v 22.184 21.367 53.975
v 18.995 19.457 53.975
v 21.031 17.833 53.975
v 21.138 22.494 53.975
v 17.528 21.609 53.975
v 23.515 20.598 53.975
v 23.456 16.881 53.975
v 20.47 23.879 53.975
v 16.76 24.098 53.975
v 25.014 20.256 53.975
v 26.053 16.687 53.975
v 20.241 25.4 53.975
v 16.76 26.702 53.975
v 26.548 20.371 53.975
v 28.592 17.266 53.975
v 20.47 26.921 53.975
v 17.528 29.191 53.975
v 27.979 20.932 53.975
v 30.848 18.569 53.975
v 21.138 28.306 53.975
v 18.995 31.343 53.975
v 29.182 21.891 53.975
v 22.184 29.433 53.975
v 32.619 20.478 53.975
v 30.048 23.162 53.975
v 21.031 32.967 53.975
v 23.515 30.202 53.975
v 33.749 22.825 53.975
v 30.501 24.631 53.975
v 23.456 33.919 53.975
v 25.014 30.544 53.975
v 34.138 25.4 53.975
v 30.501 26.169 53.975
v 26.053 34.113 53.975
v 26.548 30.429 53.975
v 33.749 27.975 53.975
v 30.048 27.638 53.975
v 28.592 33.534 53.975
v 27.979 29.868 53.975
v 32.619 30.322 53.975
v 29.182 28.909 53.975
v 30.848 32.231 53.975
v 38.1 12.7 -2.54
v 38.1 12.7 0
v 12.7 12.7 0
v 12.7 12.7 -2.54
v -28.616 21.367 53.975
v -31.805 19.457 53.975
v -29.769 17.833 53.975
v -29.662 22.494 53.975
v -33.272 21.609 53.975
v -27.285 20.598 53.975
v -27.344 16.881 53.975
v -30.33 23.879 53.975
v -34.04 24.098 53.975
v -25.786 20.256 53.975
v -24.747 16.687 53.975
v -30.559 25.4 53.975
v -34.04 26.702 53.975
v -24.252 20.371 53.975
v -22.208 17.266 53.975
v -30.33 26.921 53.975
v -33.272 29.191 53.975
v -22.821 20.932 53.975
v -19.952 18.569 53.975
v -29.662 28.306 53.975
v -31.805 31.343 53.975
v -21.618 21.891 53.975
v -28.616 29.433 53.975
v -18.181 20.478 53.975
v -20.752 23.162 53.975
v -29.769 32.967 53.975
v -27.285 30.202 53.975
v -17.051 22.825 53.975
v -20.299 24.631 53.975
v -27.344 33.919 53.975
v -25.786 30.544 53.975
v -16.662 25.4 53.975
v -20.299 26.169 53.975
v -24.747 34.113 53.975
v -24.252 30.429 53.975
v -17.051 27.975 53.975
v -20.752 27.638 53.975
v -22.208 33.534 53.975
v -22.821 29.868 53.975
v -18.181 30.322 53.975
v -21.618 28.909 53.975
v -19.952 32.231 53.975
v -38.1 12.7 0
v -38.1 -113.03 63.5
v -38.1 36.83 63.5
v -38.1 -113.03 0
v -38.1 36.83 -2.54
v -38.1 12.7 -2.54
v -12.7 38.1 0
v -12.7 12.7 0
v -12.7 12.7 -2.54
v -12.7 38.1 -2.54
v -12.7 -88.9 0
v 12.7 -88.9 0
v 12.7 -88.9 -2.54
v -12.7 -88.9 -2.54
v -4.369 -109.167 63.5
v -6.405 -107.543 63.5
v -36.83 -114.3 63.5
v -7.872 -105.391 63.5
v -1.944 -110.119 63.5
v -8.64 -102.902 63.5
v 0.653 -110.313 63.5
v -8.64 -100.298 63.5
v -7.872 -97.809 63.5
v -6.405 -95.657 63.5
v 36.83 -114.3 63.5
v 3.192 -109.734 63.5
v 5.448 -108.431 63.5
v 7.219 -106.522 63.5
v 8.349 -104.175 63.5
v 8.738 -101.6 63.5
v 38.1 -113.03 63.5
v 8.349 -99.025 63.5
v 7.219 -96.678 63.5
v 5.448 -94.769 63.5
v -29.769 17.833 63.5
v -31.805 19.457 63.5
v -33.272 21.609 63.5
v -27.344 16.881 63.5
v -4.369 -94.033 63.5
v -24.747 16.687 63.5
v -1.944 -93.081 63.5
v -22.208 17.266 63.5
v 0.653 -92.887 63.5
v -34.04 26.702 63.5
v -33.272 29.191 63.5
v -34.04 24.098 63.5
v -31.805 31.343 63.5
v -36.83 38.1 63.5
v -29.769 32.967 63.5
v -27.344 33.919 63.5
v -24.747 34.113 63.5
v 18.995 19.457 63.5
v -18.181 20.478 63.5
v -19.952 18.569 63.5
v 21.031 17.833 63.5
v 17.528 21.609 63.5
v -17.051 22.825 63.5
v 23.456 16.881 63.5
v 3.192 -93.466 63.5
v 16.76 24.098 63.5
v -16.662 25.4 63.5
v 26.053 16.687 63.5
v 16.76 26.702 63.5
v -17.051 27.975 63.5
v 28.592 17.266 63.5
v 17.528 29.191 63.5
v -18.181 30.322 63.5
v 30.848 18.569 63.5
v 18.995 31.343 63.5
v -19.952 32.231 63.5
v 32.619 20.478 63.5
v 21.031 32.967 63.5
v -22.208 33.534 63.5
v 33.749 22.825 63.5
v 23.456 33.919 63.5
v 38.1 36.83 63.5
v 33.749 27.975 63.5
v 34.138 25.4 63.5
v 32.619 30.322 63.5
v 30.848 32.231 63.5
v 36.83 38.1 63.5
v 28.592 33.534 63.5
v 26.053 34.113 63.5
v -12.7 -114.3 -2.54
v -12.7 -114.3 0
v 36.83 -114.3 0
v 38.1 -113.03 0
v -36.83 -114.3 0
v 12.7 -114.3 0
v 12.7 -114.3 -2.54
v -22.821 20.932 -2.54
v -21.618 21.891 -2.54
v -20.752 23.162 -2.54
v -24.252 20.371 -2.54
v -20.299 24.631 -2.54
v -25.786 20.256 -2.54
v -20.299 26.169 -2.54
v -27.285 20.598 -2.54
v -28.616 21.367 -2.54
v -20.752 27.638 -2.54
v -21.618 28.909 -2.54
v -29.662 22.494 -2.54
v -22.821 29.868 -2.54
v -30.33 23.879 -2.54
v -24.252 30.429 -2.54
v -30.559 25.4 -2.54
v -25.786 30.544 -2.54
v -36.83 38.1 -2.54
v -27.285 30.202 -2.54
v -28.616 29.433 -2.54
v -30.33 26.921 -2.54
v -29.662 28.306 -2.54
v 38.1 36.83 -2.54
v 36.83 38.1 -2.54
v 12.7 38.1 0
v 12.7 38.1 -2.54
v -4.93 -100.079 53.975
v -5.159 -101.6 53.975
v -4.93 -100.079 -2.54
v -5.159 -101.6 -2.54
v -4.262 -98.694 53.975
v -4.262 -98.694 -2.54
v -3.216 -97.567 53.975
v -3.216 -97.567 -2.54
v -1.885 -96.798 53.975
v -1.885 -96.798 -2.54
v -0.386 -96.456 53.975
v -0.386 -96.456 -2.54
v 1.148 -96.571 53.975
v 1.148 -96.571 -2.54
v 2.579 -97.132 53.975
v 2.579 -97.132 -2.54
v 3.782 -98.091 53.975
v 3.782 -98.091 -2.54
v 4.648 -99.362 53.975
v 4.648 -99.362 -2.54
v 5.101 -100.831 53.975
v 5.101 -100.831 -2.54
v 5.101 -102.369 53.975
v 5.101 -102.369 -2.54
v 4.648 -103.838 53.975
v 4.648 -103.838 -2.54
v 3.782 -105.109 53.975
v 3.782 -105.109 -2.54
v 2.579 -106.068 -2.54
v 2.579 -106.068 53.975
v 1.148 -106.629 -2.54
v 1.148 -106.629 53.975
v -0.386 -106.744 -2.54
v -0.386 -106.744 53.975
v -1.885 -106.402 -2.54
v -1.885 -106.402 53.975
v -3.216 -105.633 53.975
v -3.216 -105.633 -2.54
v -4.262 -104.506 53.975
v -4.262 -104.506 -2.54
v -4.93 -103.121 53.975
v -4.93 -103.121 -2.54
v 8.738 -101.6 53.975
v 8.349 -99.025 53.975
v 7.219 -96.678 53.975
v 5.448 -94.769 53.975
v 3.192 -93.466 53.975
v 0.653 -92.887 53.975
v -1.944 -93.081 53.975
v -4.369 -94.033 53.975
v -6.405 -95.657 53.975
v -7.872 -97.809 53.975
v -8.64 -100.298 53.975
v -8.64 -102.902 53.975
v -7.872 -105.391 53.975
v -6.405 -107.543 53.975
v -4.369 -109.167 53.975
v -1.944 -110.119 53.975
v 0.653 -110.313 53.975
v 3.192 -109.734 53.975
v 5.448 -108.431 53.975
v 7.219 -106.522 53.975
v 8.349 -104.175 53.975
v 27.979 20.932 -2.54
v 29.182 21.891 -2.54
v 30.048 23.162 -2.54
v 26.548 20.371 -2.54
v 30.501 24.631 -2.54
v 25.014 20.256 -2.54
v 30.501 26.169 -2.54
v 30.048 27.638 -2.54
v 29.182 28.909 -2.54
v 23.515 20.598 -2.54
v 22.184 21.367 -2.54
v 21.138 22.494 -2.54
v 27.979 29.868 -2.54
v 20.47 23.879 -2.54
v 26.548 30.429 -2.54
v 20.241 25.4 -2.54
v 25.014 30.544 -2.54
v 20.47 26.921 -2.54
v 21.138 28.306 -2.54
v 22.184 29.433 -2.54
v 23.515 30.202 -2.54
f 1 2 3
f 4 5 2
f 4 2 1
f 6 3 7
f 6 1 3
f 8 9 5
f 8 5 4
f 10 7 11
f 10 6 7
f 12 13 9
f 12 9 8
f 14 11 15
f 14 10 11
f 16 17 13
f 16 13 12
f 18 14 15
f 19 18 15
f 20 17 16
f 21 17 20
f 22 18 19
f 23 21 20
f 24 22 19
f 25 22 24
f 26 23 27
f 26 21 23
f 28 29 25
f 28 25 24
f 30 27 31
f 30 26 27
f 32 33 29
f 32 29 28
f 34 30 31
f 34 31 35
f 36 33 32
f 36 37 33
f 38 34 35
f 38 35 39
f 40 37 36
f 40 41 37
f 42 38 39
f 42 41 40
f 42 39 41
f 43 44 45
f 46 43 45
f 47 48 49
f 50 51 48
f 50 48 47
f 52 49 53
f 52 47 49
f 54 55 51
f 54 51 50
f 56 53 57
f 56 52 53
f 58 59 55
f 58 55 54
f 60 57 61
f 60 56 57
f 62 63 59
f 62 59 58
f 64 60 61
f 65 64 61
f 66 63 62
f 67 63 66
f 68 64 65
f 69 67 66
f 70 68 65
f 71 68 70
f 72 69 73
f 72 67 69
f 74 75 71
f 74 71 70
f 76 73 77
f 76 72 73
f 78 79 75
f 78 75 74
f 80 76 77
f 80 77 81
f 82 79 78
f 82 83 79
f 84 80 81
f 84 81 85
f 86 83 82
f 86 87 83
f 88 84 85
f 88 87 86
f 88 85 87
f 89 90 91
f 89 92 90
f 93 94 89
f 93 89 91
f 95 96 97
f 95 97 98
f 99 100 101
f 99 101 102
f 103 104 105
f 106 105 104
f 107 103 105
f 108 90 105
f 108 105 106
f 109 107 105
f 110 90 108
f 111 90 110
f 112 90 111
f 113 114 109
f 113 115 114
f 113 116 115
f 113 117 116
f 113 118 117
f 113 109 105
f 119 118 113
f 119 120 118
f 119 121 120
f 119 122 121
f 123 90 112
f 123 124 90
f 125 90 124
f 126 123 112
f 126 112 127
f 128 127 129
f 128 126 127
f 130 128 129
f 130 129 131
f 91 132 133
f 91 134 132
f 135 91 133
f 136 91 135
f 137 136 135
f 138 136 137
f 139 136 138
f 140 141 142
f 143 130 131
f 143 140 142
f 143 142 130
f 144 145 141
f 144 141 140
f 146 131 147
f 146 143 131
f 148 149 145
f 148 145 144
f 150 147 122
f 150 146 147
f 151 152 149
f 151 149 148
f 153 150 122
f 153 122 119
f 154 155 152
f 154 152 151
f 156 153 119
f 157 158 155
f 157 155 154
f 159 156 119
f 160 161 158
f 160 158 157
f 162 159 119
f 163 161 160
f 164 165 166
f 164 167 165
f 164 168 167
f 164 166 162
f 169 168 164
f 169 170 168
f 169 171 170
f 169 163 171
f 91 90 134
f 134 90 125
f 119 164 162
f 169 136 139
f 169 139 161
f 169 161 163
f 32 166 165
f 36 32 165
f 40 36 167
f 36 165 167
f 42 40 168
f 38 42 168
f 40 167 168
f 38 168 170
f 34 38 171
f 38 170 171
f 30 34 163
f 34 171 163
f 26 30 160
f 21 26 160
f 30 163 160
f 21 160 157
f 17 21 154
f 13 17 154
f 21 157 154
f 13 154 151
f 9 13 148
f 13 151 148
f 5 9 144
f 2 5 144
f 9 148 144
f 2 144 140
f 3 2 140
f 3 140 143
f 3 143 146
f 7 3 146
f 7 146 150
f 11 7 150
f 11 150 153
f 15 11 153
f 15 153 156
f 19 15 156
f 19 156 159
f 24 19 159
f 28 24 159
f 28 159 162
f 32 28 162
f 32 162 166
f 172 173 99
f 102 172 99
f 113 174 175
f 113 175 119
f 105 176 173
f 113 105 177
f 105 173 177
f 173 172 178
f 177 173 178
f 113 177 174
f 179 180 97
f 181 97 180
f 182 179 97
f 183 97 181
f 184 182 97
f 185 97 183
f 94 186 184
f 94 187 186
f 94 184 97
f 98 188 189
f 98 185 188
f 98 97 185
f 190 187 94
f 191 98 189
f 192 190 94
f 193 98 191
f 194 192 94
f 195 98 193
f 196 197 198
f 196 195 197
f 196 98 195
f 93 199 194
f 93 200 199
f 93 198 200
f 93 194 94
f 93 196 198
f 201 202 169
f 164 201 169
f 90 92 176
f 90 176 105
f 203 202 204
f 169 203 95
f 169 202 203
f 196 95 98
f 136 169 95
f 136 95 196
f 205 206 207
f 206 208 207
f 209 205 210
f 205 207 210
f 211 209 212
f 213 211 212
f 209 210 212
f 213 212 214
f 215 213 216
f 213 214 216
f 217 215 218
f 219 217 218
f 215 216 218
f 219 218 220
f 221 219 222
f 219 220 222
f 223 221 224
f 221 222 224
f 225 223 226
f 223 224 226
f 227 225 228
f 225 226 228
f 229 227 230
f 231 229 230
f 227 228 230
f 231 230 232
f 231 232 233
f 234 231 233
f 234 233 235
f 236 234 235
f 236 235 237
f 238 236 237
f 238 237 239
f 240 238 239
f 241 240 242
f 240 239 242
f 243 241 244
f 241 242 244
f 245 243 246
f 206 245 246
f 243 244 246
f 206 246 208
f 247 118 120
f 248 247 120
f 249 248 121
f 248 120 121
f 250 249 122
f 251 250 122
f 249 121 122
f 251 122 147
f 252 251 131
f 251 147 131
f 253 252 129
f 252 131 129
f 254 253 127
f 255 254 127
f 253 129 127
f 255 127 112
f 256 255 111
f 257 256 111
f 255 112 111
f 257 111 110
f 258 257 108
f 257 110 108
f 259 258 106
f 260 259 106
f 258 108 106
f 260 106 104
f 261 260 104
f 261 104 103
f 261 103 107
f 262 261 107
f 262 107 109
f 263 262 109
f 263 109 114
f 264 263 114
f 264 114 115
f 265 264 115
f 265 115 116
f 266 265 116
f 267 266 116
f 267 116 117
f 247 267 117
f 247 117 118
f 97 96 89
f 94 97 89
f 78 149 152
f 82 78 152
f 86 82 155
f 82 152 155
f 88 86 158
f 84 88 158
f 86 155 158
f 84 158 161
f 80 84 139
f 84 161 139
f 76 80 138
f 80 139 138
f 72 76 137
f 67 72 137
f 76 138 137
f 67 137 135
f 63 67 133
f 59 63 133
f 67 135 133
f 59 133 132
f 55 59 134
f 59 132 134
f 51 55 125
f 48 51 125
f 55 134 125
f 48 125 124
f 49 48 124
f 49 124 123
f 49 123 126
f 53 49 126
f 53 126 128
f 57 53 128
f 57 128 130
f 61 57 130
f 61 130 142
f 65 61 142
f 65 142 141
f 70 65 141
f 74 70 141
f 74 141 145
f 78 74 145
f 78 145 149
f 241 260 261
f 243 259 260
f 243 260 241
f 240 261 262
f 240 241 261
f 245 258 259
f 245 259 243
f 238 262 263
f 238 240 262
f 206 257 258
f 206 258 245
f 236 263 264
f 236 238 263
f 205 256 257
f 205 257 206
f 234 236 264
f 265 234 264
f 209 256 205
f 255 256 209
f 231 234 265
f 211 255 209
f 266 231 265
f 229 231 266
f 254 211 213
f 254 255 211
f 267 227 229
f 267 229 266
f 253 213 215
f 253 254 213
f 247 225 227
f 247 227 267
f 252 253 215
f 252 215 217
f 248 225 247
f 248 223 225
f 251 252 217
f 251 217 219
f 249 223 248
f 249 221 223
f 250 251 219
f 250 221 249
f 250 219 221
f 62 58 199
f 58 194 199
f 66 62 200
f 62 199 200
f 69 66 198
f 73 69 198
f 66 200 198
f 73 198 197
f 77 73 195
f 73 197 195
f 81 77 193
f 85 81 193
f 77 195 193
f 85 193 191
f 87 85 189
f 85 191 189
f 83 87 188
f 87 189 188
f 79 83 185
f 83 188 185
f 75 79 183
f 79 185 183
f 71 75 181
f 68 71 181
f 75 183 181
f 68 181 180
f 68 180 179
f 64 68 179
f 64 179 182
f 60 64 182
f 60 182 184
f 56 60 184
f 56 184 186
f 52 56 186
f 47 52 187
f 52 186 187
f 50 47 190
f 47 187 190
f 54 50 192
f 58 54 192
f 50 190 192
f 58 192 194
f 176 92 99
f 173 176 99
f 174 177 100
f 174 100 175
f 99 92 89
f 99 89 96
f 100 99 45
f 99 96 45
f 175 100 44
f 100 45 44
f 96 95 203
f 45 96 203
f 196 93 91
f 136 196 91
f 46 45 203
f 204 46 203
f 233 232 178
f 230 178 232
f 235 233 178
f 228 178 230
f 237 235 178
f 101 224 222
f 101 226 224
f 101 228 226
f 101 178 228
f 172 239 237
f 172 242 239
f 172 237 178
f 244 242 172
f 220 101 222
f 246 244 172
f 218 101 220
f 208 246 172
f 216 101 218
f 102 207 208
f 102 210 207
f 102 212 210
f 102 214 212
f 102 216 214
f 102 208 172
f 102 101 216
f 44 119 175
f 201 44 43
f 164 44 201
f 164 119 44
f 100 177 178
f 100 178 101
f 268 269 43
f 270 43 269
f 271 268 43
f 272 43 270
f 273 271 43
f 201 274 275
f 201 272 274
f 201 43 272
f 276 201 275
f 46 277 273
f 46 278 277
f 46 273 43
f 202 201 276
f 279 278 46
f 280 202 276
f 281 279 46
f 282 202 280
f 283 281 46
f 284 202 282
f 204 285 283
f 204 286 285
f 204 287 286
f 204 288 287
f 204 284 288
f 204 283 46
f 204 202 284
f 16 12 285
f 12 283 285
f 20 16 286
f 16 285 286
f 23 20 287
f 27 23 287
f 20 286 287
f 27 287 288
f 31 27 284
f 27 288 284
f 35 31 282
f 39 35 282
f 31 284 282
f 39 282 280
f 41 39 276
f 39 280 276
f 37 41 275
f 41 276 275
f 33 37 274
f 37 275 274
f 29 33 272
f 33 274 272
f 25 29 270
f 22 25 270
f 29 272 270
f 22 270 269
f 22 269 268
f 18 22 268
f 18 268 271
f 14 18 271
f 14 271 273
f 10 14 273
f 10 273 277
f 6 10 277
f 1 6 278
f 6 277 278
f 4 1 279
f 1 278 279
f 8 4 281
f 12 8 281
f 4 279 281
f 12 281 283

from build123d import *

# Parameters (mm, degrees)
SKETCH1_W                                        = 76.2
SKETCH1_H                                        = 152.4
EXTRUDE1_DEPTH                                   = 63.5
SKETCH4_W                                        = 25.4
SKETCH4_H                                        = 25.4
EXTRUDE2_DEPTH                                   = 2.54
CBORE_FOR_3_8_SOCKET_HEAD_CAP_SCREW1_D           = 10.31748
CBORE_FOR_3_8_SOCKET_HEAD_CAP_SCREW1_CBORE_D     = 17.4752
CBORE_FOR_3_8_SOCKET_HEAD_CAP_SCREW1_CBORE_DEPTH = 9.525
CHAMFER2_SIZE                                    = 1.27


with BuildPart() as part:
    # Sketch1 → Extrude1 (new body)
    with BuildSketch(Plane.XY):
        with Locations((0, -38.1)):
            Rectangle(SKETCH1_W, SKETCH1_H)
    extrude(amount=EXTRUDE1_DEPTH)

    # Sketch4 → Extrude2 (add)
    with BuildSketch(Plane(origin=(0, 0, 0), x_dir=(-1, 0, 0), z_dir=(0, 0, -1))):
        with Locations((-25.4, 25.4)):
            Rectangle(SKETCH4_W, SKETCH4_H)
        with Locations((25.4, 25.4)):
            Rectangle(SKETCH4_W, SKETCH4_H)
        with Locations((0, -101.6)):
            Rectangle(SKETCH4_W, SKETCH4_H)
    extrude(amount=EXTRUDE2_DEPTH)

    # CBORE for 3/8 Socket Head Cap Screw1 (through all)
    with Locations(Plane.XY.offset(63.5)):
        with Locations((-25.4, 25.4), (25.4, 25.4), (0, -101.6)):
            CounterBoreHole(CBORE_FOR_3_8_SOCKET_HEAD_CAP_SCREW1_D / 2, CBORE_FOR_3_8_SOCKET_HEAD_CAP_SCREW1_CBORE_D / 2, CBORE_FOR_3_8_SOCKET_HEAD_CAP_SCREW1_CBORE_DEPTH)

    # Chamfer2
    chamfer2_edges = [part.edges().sort_by_distance(p)[0] for p in [
        (-38.1, 38.1, 30.48),
        (38.1, 38.1, 30.48),
        (38.1, -114.3, 31.75),
        (-38.1, -114.3, 31.75),
    ]]
    chamfer(chamfer2_edges, length=CHAMFER2_SIZE)


solid = part.part
